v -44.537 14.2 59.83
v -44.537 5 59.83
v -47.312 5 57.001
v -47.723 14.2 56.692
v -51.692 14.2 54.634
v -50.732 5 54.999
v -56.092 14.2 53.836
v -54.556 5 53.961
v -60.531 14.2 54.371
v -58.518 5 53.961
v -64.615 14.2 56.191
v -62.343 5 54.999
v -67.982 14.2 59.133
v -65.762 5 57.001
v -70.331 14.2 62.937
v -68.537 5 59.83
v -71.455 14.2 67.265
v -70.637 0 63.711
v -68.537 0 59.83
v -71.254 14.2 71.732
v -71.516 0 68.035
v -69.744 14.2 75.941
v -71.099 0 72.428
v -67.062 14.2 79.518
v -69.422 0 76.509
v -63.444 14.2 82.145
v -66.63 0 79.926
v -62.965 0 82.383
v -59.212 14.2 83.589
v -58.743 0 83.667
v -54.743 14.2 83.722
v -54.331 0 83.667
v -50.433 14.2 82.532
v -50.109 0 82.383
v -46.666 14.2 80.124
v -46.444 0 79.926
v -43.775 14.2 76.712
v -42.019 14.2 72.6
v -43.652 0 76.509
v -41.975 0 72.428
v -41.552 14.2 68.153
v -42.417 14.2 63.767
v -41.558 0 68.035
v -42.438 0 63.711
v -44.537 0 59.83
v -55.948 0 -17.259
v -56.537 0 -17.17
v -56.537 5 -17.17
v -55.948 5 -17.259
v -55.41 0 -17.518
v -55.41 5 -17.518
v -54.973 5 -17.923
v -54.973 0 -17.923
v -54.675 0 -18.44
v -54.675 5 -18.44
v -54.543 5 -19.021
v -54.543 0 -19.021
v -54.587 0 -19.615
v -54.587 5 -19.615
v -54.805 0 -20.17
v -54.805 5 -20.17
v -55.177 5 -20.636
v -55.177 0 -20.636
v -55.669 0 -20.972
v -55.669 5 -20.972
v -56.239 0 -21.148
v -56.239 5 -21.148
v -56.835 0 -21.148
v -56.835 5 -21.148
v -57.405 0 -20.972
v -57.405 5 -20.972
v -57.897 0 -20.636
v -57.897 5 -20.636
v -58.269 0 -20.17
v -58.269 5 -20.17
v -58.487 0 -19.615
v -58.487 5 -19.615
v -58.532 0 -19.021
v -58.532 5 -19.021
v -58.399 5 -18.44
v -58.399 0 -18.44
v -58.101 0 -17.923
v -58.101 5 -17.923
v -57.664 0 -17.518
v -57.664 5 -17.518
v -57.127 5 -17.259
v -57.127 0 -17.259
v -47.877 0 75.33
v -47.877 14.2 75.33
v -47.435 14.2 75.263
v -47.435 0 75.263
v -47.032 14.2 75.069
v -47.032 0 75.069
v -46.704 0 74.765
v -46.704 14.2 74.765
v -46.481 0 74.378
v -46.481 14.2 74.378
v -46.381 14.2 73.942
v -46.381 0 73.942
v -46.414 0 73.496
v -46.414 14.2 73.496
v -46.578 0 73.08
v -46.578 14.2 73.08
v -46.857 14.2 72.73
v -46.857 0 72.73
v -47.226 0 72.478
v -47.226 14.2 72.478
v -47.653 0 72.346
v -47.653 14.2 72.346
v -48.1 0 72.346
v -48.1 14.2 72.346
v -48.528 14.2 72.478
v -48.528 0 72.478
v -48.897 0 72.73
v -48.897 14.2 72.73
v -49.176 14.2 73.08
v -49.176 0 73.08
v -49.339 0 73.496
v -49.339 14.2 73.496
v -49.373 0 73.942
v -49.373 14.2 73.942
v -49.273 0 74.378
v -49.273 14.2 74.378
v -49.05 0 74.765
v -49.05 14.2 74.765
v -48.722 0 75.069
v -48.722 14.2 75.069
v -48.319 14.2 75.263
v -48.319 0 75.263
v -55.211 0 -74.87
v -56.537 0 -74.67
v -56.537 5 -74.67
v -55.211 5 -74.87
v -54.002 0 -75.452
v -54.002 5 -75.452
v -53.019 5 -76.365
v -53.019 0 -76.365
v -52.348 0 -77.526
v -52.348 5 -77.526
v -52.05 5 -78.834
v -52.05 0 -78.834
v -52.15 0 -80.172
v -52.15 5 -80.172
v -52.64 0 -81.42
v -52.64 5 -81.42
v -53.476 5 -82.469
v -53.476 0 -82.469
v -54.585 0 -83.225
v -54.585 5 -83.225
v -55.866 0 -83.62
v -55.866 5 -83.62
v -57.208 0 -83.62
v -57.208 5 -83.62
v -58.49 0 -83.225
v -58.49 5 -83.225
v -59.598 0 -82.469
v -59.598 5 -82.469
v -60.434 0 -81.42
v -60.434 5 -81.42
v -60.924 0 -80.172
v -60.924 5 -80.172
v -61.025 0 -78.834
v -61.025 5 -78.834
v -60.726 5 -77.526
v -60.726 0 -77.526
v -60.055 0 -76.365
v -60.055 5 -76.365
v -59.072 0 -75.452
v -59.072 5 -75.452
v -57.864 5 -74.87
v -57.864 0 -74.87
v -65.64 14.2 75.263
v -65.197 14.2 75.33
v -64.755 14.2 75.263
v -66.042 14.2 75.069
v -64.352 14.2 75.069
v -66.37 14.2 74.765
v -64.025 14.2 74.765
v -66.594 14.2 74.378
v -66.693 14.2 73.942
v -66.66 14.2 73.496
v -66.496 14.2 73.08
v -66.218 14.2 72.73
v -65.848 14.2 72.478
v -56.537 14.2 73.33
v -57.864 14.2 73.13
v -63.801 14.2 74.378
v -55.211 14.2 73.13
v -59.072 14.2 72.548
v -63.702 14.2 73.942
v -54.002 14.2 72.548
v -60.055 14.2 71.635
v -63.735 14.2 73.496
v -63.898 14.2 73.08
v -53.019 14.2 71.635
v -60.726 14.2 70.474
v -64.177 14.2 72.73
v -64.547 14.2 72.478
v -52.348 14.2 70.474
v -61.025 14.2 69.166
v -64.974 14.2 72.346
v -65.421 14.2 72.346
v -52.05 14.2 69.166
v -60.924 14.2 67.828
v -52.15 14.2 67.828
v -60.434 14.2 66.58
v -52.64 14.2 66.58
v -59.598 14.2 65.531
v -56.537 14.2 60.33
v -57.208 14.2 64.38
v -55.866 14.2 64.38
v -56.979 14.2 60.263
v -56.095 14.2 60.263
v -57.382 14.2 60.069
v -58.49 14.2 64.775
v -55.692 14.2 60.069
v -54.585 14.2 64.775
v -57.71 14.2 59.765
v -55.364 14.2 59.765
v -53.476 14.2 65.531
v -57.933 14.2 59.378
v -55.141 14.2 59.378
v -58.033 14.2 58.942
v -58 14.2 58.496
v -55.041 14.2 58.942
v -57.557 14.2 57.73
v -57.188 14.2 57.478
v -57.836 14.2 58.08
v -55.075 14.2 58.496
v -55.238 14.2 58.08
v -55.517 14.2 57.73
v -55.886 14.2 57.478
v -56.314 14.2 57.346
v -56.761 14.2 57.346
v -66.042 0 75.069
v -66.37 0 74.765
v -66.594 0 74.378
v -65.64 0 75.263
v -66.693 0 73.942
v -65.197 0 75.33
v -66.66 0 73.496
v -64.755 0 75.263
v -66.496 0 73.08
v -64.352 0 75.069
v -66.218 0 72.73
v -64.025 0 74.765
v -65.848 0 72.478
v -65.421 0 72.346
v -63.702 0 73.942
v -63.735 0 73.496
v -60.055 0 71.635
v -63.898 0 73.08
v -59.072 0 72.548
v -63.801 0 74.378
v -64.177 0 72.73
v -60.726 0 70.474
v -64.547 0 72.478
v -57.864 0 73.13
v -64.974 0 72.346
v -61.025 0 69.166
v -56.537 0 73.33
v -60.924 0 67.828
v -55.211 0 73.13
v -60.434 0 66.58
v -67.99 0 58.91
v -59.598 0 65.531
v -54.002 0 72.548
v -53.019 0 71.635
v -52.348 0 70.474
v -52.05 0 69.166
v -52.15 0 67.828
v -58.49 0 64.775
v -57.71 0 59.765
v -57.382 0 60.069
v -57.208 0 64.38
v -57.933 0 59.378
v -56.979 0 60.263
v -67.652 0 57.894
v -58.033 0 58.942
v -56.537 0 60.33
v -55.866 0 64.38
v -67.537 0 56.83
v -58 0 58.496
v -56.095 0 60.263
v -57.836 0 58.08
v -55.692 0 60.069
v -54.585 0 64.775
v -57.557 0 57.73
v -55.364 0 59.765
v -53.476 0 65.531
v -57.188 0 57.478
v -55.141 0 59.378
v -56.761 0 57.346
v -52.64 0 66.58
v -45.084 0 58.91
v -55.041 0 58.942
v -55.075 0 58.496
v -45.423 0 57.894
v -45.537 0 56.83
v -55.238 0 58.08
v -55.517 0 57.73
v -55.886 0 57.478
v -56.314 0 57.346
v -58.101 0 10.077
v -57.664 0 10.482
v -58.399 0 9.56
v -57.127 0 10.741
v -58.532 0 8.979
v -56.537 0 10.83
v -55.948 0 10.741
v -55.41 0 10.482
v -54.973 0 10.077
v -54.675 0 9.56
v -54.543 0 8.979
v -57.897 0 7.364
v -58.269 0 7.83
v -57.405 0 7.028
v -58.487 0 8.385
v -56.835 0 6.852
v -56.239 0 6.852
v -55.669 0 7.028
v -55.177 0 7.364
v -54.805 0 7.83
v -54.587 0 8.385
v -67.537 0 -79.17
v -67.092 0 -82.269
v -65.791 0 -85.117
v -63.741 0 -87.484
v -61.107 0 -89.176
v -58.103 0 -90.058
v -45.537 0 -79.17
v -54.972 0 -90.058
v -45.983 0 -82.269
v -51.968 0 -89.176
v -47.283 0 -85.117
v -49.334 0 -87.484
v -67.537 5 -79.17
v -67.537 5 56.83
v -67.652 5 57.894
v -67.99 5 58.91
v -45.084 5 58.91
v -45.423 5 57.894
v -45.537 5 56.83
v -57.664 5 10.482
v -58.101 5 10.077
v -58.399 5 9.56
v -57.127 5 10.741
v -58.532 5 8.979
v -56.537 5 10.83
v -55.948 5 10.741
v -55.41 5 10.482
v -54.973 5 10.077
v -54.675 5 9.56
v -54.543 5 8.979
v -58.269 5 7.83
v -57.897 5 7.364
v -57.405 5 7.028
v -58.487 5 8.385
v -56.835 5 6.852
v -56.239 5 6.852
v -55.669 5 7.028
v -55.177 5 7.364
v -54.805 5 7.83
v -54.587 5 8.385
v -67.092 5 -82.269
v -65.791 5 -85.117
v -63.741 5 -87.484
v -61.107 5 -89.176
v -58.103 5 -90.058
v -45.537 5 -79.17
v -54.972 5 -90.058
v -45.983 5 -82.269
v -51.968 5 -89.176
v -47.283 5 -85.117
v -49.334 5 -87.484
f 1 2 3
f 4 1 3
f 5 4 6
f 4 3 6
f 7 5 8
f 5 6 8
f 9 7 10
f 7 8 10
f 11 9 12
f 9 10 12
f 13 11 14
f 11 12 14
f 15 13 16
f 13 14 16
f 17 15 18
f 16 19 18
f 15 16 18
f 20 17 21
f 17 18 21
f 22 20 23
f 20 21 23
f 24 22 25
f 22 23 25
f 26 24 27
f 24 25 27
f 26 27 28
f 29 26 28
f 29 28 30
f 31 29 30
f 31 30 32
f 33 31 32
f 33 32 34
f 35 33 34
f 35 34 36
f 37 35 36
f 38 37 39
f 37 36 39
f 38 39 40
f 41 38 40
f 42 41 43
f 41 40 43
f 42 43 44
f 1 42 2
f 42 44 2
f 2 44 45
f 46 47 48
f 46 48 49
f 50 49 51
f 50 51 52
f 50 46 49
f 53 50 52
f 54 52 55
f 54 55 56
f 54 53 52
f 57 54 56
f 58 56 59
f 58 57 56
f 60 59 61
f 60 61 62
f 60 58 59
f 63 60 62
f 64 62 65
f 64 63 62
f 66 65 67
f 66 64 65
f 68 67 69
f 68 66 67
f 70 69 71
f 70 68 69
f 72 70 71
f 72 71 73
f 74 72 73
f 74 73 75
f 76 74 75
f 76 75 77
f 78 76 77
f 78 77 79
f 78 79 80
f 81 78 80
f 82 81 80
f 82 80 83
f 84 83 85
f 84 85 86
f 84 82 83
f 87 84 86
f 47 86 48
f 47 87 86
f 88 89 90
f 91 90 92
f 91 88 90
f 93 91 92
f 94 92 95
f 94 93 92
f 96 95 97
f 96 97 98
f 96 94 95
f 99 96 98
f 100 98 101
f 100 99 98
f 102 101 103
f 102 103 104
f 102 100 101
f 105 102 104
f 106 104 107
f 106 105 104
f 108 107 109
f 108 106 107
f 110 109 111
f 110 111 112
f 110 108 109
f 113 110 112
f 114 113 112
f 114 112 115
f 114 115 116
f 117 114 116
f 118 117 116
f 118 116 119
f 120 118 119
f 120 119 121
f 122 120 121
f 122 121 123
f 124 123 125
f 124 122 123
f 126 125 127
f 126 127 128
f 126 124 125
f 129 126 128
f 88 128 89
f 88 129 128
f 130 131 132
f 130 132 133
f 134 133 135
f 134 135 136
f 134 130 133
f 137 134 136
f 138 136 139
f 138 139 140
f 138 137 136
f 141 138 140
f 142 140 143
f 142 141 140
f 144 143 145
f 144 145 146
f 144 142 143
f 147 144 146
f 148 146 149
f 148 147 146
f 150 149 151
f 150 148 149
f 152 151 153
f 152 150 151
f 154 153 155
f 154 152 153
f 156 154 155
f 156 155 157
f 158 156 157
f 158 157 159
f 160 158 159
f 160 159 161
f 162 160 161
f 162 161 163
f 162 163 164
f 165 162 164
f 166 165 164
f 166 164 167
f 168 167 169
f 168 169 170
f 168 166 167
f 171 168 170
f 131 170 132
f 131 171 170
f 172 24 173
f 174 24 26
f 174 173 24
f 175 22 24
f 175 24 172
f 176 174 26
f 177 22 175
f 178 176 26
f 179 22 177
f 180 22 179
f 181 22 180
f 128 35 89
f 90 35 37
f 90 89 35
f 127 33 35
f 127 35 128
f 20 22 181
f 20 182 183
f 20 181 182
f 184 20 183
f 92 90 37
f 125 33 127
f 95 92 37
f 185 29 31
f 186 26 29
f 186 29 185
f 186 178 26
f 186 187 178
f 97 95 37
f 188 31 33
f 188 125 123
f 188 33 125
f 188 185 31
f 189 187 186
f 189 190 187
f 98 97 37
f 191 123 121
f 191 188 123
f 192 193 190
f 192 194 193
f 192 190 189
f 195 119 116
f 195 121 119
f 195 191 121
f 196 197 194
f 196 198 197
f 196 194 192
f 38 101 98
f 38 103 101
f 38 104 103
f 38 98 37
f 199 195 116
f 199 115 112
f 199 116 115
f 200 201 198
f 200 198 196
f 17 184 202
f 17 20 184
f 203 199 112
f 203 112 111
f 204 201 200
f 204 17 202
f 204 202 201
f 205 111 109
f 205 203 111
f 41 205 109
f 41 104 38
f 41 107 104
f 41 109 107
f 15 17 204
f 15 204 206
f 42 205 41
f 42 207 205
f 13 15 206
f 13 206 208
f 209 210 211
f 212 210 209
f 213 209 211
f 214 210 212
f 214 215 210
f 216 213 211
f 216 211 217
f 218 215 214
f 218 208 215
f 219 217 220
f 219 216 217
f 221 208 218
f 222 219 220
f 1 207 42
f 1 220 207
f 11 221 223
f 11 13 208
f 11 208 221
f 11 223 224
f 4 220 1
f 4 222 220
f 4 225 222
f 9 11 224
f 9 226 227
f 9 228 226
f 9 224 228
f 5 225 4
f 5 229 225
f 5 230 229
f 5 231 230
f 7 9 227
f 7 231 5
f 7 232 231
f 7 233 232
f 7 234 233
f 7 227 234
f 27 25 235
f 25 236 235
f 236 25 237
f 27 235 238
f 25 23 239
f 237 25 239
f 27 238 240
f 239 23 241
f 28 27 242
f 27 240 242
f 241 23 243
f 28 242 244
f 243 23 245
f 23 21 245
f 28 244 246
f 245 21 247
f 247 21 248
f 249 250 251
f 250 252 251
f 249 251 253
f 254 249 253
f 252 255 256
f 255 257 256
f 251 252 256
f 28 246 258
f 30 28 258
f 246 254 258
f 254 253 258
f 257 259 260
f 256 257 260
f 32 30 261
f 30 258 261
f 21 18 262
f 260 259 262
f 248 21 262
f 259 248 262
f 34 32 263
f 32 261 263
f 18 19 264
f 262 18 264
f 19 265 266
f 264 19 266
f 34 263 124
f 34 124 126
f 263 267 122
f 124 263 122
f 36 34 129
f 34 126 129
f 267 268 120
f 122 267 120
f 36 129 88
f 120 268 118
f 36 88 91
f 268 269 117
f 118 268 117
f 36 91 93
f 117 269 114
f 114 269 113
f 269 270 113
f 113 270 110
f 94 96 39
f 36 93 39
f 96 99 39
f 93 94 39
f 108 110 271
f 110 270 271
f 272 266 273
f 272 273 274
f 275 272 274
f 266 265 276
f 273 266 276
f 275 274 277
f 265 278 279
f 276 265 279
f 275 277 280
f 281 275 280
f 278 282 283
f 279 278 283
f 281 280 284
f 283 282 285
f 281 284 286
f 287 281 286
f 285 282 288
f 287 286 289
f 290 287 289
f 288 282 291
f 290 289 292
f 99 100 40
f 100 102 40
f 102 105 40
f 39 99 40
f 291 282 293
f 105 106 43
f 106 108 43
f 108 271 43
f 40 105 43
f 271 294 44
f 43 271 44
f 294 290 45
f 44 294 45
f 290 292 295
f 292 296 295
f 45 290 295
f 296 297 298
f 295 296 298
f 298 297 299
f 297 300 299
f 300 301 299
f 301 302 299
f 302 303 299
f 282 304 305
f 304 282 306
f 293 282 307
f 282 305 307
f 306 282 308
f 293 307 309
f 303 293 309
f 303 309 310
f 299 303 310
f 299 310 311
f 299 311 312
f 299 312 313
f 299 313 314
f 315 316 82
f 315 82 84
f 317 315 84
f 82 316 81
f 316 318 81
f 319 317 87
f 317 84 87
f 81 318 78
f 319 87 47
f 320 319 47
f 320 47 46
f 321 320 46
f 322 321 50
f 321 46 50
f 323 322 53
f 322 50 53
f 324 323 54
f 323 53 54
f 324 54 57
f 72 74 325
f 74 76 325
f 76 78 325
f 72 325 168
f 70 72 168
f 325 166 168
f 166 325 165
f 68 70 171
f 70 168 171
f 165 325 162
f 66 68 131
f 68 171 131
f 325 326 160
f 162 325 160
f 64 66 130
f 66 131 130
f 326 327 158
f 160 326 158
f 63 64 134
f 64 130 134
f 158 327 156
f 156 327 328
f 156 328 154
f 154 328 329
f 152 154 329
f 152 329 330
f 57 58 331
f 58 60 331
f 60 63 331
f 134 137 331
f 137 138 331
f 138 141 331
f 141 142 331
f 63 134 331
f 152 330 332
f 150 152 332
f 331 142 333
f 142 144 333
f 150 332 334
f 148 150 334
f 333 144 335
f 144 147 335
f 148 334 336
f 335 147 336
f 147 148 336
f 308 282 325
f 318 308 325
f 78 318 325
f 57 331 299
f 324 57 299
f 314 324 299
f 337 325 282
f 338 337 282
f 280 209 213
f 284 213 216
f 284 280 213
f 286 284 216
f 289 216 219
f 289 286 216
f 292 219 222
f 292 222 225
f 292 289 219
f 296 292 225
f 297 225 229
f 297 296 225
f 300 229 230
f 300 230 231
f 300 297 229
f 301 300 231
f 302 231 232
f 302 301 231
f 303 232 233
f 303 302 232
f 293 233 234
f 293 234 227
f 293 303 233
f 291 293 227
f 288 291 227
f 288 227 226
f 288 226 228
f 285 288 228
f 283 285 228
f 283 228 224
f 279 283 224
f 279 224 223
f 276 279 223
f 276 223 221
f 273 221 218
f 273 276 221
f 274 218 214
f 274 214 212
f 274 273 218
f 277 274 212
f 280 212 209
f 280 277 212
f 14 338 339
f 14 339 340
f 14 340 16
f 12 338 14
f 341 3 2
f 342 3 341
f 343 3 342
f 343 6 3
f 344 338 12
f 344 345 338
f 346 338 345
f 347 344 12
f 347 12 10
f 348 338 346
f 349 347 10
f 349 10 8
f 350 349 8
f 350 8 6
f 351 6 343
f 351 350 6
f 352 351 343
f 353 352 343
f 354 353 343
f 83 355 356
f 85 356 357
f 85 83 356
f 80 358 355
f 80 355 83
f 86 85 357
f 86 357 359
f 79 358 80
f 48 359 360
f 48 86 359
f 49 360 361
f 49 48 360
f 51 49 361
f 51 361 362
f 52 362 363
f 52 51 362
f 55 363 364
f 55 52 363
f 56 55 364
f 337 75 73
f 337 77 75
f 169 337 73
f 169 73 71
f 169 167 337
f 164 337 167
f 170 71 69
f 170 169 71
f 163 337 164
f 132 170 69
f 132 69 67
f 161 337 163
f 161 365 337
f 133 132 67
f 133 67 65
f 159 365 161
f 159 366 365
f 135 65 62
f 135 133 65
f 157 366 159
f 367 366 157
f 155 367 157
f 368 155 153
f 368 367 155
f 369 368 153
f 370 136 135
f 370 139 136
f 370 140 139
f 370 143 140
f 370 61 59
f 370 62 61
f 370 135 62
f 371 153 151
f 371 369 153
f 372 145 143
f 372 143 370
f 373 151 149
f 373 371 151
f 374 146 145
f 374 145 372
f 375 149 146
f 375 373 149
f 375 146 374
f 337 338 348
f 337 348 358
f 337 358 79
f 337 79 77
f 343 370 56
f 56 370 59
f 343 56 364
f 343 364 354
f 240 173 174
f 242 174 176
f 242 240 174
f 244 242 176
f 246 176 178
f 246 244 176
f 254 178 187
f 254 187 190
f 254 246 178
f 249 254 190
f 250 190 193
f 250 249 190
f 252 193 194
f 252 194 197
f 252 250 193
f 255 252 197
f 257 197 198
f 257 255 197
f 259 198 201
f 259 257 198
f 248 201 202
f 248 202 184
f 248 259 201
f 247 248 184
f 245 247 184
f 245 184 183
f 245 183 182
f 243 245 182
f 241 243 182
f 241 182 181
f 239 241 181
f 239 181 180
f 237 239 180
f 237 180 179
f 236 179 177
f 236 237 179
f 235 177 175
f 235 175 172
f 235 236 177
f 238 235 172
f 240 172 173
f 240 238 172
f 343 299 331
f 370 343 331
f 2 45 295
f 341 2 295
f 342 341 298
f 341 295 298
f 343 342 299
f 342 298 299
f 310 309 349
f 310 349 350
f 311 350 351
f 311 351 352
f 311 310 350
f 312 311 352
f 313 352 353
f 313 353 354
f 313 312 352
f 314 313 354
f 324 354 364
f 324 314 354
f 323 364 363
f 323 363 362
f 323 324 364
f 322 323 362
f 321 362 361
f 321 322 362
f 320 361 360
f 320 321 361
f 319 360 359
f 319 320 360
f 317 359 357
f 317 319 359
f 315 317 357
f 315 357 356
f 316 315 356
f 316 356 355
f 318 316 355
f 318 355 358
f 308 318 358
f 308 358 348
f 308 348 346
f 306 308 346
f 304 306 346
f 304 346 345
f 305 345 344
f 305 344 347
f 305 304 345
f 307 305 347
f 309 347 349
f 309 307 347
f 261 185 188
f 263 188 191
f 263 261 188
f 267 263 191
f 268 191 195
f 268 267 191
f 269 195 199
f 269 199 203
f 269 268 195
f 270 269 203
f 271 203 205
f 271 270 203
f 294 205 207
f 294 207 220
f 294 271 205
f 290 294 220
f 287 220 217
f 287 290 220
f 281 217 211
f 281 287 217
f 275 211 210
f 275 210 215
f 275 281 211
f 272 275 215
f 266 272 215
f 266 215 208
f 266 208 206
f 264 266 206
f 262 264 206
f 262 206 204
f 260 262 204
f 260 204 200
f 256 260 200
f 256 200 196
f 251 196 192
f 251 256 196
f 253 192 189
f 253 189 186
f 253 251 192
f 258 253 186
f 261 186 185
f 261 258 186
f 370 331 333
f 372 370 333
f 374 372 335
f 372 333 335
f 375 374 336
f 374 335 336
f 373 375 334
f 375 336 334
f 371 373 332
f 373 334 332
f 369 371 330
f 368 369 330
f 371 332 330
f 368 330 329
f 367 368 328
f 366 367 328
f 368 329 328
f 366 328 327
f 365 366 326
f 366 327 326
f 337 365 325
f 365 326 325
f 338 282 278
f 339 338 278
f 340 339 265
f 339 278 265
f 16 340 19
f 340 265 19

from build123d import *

# Parameters (mm, degrees)
SKETCH_1_R      = 4.5
SKETCH_1_R_2    = 2
SKETCH_1_R_3    = 1.5
EXTRUDE_1_DEPTH = 5
SKETCH_2_R      = 15
SKETCH_2_R_2    = 1.5
SKETCH_2_R_3    = 4.5
EXTRUDE_3_DEPTH = 9.2


with BuildPart() as part:
    # 草图1 → 凸台-拉伸1 (new body)
    with BuildSketch(Plane(origin=(0, 0, 0), x_dir=(1, 0, 0), z_dir=(0, 1, 0))):
        with BuildLine():
            Line((-67.537117904, 79.170305677), (-67.537117904, -56.829694323))
            ThreePointArc((-67.537117904, -56.829694323), (-67.793701414, -58.410833153), (-68.537117904, -59.829694323))
            ThreePointArc((-68.537117904, -59.829694323), (-56.537117904, -83.829694323), (-44.537117904, -59.829694323))
            ThreePointArc((-44.537117904, -59.829694323), (-45.280534394, -58.410833153), (-45.537117904, -56.829694323))
            Line((-45.537117904, -56.829694323), (-45.537117904, 79.170305677))
            ThreePointArc((-45.537117904, 79.170305677), (-56.537117904, 90.170305677), (-67.537117904, 79.170305677))
        make_face()
        with Locations(Location((-56.537117904, 79.170305677, 0), (0, 0, 270))):
            Circle(SKETCH_1_R, mode=Mode.SUBTRACT)
        with Locations(Location((-56.537117904, 19.170305677, 0), (0, 0, 270))):
            Circle(SKETCH_1_R_2, mode=Mode.SUBTRACT)
        with Locations(Location((-56.537117904, -8.829694323, 0), (0, 0, 270))):
            Circle(SKETCH_1_R_2, mode=Mode.SUBTRACT)
        with Locations(Location((-56.537117904, -68.829694323, 0), (0, 0, 270))):
            Circle(SKETCH_1_R, mode=Mode.SUBTRACT)
        with Locations(Location((-65.197371942, -73.829694323, 0), (0, 0, 270))):
            Circle(SKETCH_1_R_3, mode=Mode.SUBTRACT)
        with Locations(Location((-47.876863866, -73.829694323, 0), (0, 0, 270))):
            Circle(SKETCH_1_R_3, mode=Mode.SUBTRACT)
        with Locations(Location((-56.537117904, -58.829694323, 0), (0, 0, 270))):
            Circle(SKETCH_1_R_3, mode=Mode.SUBTRACT)
    extrude(amount=EXTRUDE_1_DEPTH)

    # 草图2 → 凸台-拉伸3 (add)
    with BuildSketch(Plane(origin=(0, 5, 0), x_dir=(1, 0, 0), z_dir=(0, 1, 0))):
        with Locations(Location((-56.537117904, -68.829694323, 0), (0, 0, 36.869897646))):
            Circle(SKETCH_2_R)
        with Locations(Location((-65.197371942, -73.829694323, 0), (0, 0, 270))):
            Circle(SKETCH_2_R_2, mode=Mode.SUBTRACT)
        with Locations(Location((-56.537117904, -58.829694323, 0), (0, 0, 270))):
            Circle(SKETCH_2_R_2, mode=Mode.SUBTRACT)
        with Locations(Location((-47.876863866, -73.829694323, 0), (0, 0, 270))):
            Circle(SKETCH_2_R_2, mode=Mode.SUBTRACT)
        with Locations(Location((-56.537117904, -68.829694323, 0), (0, 0, 270))):
            Circle(SKETCH_2_R_3, mode=Mode.SUBTRACT)
    extrude(amount=EXTRUDE_3_DEPTH)


solid = part.part
